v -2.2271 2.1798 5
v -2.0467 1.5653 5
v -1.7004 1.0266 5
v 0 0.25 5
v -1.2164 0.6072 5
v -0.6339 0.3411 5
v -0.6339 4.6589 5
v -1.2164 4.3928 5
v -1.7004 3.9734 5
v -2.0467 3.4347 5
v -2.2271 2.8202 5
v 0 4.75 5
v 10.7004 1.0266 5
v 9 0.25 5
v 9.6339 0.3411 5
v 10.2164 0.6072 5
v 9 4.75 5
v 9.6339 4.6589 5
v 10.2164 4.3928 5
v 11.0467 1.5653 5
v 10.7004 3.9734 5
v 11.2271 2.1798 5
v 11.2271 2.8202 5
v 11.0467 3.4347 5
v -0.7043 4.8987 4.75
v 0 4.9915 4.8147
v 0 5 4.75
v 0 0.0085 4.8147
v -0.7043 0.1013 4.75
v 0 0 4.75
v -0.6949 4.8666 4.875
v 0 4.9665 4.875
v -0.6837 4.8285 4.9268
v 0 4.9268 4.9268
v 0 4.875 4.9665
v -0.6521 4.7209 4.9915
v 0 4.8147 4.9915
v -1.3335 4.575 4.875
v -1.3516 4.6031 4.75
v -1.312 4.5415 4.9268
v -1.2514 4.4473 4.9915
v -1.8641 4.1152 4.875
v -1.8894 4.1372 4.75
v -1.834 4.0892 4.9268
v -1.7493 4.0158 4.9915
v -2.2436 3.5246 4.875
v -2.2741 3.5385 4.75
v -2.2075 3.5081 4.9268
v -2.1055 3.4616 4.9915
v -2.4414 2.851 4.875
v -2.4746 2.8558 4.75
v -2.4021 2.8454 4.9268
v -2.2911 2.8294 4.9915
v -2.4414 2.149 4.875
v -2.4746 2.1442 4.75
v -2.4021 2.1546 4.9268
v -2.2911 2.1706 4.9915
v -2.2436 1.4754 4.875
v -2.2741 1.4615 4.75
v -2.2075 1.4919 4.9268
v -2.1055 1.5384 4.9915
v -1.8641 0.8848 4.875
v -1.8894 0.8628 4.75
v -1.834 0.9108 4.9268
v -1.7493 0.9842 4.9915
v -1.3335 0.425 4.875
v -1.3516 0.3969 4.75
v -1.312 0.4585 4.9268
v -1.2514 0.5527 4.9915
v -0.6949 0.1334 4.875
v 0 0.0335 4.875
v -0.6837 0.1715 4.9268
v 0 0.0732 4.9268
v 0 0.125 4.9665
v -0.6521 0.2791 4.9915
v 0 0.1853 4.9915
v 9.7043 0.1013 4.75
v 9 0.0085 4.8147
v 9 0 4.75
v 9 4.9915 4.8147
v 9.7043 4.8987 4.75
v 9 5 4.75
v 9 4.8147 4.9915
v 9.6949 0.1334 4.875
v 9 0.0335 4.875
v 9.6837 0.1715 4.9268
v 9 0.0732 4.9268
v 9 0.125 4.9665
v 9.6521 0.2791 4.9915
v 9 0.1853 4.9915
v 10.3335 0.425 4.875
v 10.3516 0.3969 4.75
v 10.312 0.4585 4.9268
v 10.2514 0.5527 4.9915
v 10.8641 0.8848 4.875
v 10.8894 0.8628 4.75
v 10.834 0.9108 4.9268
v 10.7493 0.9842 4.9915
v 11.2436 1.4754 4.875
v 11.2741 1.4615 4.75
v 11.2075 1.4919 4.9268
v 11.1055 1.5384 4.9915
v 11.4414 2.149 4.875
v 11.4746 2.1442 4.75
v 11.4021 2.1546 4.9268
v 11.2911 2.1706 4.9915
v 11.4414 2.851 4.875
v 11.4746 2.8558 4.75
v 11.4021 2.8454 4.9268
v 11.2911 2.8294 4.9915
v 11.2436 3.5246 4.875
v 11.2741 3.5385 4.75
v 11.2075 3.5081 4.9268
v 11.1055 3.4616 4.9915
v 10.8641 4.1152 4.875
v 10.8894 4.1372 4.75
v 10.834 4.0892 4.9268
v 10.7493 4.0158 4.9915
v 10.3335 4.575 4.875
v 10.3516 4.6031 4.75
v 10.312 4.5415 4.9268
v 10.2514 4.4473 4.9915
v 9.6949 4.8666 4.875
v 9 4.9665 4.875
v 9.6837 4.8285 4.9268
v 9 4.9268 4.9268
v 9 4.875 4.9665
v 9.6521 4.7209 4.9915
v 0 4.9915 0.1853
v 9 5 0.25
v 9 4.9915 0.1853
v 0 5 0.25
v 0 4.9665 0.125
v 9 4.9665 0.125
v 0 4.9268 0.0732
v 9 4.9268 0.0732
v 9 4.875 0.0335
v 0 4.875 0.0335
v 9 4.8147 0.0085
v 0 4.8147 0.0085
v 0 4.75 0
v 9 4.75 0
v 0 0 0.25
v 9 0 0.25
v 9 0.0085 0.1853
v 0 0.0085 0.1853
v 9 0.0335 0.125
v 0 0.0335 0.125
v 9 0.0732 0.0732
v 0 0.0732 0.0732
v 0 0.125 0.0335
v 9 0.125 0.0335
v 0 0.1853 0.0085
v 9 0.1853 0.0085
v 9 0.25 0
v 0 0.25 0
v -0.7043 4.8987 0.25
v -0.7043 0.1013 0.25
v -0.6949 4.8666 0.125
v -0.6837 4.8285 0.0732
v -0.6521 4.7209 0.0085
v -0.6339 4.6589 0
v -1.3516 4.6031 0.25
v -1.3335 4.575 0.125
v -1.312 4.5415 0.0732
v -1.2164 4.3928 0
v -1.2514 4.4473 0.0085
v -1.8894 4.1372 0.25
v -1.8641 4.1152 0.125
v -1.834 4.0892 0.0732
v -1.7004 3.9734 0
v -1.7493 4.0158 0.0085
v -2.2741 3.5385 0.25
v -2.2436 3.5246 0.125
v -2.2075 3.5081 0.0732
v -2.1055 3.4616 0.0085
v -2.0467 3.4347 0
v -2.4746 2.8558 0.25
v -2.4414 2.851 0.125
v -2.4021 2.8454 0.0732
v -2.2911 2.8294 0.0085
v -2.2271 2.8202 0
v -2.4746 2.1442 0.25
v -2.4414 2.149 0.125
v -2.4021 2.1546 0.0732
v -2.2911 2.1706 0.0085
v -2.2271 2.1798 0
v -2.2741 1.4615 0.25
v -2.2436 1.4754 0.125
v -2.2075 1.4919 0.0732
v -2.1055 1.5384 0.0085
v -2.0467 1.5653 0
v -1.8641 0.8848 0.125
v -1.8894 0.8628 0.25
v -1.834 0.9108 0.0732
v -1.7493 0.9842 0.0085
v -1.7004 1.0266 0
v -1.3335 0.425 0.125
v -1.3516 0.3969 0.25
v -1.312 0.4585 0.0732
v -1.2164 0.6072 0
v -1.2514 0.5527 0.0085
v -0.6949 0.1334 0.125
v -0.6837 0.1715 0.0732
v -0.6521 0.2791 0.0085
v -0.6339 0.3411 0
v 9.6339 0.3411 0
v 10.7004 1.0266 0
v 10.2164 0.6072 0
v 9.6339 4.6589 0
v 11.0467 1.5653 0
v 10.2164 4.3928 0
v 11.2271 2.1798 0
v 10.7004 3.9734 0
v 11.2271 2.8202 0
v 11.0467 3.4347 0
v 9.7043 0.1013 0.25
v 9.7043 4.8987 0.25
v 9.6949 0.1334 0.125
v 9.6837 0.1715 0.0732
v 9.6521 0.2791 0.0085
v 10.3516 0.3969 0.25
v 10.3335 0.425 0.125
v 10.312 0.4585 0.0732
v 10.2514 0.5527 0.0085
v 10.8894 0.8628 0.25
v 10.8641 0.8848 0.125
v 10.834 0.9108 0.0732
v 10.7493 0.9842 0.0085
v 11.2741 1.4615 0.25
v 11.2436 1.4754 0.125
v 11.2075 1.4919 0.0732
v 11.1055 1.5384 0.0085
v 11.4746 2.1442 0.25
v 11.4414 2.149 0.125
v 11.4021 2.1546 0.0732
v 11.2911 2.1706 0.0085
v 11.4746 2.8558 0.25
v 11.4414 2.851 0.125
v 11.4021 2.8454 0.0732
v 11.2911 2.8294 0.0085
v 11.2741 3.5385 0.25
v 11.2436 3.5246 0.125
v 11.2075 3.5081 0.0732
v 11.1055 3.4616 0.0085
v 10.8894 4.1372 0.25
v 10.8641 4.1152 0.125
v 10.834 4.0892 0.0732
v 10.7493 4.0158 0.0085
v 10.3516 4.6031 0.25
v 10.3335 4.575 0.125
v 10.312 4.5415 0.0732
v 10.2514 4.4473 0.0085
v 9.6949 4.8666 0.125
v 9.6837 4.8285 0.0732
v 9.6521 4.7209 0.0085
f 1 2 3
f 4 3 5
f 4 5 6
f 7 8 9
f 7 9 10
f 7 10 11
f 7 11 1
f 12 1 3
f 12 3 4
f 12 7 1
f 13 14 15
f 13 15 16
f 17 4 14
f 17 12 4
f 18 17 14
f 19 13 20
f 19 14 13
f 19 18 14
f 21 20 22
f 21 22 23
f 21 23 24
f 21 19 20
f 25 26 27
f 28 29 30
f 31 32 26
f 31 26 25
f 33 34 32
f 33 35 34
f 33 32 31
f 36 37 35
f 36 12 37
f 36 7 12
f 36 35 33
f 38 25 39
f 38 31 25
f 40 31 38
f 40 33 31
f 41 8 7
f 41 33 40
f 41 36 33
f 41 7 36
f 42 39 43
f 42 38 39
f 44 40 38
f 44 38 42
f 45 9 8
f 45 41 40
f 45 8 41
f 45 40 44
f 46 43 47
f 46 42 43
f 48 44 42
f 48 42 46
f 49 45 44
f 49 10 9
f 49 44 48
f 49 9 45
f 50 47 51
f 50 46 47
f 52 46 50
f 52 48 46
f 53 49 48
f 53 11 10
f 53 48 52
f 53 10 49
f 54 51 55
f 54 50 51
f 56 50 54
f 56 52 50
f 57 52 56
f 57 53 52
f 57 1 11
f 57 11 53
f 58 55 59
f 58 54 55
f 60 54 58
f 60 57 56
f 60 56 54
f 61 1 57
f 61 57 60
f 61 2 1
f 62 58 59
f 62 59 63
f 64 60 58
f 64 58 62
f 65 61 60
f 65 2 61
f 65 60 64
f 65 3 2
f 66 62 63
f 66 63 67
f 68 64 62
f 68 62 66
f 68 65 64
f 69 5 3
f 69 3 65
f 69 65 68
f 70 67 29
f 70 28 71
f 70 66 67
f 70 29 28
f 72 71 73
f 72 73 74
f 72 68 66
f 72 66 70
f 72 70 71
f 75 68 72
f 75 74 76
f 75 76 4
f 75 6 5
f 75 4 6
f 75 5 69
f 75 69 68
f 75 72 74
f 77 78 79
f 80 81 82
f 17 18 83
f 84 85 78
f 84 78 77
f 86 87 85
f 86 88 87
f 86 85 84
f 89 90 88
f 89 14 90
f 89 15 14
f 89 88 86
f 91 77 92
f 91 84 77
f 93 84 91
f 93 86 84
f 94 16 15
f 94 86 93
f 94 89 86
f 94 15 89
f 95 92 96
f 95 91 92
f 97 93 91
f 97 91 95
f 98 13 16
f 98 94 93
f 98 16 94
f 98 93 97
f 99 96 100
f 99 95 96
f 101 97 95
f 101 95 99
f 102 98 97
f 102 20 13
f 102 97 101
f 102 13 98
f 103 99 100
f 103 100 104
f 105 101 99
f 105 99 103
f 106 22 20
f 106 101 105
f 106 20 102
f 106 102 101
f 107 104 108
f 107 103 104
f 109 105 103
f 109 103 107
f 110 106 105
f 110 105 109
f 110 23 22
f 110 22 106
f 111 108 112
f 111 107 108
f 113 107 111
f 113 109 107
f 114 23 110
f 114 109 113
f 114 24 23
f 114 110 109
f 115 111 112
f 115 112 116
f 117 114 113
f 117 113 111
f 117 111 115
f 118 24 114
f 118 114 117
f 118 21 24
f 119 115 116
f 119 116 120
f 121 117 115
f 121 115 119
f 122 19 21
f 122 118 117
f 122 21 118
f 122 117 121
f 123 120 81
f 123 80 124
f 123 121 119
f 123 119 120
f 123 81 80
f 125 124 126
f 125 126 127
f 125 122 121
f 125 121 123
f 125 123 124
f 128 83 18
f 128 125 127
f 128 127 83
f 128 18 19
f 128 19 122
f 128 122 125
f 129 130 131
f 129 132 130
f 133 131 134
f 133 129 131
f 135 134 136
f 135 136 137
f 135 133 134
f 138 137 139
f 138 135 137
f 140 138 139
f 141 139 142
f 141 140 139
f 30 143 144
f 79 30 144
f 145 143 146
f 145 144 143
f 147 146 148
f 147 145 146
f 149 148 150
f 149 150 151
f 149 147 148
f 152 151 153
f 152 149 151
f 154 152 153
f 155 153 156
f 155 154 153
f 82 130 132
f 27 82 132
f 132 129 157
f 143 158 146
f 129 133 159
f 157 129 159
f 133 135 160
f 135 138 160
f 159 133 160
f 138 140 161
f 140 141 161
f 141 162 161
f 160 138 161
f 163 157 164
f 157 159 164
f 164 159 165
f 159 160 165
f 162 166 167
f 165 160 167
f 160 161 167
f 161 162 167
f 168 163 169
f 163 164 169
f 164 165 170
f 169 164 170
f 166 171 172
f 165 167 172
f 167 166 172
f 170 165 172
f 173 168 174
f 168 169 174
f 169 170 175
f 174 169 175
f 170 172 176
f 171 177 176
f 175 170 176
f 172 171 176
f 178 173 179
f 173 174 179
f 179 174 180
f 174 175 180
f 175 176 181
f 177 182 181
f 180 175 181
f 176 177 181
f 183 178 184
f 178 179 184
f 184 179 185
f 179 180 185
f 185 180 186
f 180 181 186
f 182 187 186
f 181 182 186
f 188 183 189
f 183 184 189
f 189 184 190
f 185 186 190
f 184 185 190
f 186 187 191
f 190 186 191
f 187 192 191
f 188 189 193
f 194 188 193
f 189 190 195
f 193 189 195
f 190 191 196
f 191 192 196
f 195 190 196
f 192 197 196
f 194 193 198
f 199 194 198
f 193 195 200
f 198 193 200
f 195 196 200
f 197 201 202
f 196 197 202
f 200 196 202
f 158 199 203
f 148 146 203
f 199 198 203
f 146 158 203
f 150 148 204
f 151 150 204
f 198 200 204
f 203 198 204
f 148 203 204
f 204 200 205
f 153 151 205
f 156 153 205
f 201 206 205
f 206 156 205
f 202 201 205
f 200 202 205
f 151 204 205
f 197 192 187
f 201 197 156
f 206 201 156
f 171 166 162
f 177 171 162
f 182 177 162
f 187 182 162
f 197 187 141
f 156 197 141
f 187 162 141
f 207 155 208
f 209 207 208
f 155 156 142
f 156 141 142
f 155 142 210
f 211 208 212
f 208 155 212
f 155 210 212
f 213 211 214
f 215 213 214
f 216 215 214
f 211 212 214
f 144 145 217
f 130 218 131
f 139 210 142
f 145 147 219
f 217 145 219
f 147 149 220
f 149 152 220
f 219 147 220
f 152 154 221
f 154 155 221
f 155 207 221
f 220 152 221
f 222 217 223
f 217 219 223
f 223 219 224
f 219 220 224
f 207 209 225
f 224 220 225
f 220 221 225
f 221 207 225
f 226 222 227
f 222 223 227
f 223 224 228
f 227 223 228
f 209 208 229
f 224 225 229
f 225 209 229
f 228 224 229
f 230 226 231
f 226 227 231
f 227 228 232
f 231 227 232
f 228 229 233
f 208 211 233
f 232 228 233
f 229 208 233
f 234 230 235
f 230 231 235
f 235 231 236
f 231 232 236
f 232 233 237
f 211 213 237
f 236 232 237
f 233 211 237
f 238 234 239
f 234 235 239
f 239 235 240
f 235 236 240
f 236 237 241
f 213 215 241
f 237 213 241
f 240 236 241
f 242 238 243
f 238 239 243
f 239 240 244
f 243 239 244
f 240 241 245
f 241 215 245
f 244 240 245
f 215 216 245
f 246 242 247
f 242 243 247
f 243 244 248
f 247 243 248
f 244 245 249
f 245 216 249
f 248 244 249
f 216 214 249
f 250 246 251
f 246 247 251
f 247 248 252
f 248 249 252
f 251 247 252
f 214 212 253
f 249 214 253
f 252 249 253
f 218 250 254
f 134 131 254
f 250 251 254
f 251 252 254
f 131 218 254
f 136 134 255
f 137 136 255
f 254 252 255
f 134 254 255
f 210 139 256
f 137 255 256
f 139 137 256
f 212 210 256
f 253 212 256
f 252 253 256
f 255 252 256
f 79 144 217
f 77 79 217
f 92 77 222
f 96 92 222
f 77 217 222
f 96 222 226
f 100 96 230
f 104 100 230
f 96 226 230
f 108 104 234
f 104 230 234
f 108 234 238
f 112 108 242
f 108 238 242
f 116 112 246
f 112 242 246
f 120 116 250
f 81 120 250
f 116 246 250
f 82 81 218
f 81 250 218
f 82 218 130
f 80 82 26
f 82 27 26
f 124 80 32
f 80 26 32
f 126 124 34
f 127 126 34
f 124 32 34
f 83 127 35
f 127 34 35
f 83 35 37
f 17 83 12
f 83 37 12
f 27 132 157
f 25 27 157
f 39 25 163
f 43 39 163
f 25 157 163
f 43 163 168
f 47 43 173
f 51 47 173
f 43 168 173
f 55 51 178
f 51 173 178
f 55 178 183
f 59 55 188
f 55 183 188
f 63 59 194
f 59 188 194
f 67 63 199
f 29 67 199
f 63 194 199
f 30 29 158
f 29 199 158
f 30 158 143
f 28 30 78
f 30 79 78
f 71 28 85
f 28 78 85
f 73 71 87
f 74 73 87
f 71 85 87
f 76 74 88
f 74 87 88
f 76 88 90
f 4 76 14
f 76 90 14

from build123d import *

# Parameters (mm, degrees)
BOSS_EXTRUDE1_DEPTH = 5
FILLET3_R           = 0.25


with BuildPart() as part:
    # Sketch1 → Boss-Extrude1 (new body)
    with BuildSketch(Plane.XY):
        with BuildLine():
            Line((0, 0), (0, 5))
            ThreePointArc((0, 5), (-2.5, 2.5), (0, 0))
        make_face()
        with BuildLine():
            ThreePointArc((9, 0), (11.5, 2.5), (9, 5))
            Line((9, 5), (0, 5))
            ThreePointArc((0, 5), (-2.5, 2.5), (0, 0))
            Line((0, 0), (9, 0))
        make_face()
        with BuildLine():
            Line((9, 0), (9, 5))
            ThreePointArc((9, 5), (11.5, 2.5), (9, 0))
        make_face()
    extrude(amount=BOSS_EXTRUDE1_DEPTH)

    # Fillet3
    fillet3_edges = [part.edges().sort_by_distance(p)[0] for p in [
        (11.5, 2.5, 5),
        (4.5, 5, 5),
        (-2.5, 2.5, 5),
        (-2.5, 2.5, 0),
        (4.5, 0, 5),
        (4.5, 5, 0),
        (11.5, 2.5, 0),
        (4.5, 0, 0),
    ]]
    fillet(fillet3_edges, radius=FILLET3_R)


solid = part.part
